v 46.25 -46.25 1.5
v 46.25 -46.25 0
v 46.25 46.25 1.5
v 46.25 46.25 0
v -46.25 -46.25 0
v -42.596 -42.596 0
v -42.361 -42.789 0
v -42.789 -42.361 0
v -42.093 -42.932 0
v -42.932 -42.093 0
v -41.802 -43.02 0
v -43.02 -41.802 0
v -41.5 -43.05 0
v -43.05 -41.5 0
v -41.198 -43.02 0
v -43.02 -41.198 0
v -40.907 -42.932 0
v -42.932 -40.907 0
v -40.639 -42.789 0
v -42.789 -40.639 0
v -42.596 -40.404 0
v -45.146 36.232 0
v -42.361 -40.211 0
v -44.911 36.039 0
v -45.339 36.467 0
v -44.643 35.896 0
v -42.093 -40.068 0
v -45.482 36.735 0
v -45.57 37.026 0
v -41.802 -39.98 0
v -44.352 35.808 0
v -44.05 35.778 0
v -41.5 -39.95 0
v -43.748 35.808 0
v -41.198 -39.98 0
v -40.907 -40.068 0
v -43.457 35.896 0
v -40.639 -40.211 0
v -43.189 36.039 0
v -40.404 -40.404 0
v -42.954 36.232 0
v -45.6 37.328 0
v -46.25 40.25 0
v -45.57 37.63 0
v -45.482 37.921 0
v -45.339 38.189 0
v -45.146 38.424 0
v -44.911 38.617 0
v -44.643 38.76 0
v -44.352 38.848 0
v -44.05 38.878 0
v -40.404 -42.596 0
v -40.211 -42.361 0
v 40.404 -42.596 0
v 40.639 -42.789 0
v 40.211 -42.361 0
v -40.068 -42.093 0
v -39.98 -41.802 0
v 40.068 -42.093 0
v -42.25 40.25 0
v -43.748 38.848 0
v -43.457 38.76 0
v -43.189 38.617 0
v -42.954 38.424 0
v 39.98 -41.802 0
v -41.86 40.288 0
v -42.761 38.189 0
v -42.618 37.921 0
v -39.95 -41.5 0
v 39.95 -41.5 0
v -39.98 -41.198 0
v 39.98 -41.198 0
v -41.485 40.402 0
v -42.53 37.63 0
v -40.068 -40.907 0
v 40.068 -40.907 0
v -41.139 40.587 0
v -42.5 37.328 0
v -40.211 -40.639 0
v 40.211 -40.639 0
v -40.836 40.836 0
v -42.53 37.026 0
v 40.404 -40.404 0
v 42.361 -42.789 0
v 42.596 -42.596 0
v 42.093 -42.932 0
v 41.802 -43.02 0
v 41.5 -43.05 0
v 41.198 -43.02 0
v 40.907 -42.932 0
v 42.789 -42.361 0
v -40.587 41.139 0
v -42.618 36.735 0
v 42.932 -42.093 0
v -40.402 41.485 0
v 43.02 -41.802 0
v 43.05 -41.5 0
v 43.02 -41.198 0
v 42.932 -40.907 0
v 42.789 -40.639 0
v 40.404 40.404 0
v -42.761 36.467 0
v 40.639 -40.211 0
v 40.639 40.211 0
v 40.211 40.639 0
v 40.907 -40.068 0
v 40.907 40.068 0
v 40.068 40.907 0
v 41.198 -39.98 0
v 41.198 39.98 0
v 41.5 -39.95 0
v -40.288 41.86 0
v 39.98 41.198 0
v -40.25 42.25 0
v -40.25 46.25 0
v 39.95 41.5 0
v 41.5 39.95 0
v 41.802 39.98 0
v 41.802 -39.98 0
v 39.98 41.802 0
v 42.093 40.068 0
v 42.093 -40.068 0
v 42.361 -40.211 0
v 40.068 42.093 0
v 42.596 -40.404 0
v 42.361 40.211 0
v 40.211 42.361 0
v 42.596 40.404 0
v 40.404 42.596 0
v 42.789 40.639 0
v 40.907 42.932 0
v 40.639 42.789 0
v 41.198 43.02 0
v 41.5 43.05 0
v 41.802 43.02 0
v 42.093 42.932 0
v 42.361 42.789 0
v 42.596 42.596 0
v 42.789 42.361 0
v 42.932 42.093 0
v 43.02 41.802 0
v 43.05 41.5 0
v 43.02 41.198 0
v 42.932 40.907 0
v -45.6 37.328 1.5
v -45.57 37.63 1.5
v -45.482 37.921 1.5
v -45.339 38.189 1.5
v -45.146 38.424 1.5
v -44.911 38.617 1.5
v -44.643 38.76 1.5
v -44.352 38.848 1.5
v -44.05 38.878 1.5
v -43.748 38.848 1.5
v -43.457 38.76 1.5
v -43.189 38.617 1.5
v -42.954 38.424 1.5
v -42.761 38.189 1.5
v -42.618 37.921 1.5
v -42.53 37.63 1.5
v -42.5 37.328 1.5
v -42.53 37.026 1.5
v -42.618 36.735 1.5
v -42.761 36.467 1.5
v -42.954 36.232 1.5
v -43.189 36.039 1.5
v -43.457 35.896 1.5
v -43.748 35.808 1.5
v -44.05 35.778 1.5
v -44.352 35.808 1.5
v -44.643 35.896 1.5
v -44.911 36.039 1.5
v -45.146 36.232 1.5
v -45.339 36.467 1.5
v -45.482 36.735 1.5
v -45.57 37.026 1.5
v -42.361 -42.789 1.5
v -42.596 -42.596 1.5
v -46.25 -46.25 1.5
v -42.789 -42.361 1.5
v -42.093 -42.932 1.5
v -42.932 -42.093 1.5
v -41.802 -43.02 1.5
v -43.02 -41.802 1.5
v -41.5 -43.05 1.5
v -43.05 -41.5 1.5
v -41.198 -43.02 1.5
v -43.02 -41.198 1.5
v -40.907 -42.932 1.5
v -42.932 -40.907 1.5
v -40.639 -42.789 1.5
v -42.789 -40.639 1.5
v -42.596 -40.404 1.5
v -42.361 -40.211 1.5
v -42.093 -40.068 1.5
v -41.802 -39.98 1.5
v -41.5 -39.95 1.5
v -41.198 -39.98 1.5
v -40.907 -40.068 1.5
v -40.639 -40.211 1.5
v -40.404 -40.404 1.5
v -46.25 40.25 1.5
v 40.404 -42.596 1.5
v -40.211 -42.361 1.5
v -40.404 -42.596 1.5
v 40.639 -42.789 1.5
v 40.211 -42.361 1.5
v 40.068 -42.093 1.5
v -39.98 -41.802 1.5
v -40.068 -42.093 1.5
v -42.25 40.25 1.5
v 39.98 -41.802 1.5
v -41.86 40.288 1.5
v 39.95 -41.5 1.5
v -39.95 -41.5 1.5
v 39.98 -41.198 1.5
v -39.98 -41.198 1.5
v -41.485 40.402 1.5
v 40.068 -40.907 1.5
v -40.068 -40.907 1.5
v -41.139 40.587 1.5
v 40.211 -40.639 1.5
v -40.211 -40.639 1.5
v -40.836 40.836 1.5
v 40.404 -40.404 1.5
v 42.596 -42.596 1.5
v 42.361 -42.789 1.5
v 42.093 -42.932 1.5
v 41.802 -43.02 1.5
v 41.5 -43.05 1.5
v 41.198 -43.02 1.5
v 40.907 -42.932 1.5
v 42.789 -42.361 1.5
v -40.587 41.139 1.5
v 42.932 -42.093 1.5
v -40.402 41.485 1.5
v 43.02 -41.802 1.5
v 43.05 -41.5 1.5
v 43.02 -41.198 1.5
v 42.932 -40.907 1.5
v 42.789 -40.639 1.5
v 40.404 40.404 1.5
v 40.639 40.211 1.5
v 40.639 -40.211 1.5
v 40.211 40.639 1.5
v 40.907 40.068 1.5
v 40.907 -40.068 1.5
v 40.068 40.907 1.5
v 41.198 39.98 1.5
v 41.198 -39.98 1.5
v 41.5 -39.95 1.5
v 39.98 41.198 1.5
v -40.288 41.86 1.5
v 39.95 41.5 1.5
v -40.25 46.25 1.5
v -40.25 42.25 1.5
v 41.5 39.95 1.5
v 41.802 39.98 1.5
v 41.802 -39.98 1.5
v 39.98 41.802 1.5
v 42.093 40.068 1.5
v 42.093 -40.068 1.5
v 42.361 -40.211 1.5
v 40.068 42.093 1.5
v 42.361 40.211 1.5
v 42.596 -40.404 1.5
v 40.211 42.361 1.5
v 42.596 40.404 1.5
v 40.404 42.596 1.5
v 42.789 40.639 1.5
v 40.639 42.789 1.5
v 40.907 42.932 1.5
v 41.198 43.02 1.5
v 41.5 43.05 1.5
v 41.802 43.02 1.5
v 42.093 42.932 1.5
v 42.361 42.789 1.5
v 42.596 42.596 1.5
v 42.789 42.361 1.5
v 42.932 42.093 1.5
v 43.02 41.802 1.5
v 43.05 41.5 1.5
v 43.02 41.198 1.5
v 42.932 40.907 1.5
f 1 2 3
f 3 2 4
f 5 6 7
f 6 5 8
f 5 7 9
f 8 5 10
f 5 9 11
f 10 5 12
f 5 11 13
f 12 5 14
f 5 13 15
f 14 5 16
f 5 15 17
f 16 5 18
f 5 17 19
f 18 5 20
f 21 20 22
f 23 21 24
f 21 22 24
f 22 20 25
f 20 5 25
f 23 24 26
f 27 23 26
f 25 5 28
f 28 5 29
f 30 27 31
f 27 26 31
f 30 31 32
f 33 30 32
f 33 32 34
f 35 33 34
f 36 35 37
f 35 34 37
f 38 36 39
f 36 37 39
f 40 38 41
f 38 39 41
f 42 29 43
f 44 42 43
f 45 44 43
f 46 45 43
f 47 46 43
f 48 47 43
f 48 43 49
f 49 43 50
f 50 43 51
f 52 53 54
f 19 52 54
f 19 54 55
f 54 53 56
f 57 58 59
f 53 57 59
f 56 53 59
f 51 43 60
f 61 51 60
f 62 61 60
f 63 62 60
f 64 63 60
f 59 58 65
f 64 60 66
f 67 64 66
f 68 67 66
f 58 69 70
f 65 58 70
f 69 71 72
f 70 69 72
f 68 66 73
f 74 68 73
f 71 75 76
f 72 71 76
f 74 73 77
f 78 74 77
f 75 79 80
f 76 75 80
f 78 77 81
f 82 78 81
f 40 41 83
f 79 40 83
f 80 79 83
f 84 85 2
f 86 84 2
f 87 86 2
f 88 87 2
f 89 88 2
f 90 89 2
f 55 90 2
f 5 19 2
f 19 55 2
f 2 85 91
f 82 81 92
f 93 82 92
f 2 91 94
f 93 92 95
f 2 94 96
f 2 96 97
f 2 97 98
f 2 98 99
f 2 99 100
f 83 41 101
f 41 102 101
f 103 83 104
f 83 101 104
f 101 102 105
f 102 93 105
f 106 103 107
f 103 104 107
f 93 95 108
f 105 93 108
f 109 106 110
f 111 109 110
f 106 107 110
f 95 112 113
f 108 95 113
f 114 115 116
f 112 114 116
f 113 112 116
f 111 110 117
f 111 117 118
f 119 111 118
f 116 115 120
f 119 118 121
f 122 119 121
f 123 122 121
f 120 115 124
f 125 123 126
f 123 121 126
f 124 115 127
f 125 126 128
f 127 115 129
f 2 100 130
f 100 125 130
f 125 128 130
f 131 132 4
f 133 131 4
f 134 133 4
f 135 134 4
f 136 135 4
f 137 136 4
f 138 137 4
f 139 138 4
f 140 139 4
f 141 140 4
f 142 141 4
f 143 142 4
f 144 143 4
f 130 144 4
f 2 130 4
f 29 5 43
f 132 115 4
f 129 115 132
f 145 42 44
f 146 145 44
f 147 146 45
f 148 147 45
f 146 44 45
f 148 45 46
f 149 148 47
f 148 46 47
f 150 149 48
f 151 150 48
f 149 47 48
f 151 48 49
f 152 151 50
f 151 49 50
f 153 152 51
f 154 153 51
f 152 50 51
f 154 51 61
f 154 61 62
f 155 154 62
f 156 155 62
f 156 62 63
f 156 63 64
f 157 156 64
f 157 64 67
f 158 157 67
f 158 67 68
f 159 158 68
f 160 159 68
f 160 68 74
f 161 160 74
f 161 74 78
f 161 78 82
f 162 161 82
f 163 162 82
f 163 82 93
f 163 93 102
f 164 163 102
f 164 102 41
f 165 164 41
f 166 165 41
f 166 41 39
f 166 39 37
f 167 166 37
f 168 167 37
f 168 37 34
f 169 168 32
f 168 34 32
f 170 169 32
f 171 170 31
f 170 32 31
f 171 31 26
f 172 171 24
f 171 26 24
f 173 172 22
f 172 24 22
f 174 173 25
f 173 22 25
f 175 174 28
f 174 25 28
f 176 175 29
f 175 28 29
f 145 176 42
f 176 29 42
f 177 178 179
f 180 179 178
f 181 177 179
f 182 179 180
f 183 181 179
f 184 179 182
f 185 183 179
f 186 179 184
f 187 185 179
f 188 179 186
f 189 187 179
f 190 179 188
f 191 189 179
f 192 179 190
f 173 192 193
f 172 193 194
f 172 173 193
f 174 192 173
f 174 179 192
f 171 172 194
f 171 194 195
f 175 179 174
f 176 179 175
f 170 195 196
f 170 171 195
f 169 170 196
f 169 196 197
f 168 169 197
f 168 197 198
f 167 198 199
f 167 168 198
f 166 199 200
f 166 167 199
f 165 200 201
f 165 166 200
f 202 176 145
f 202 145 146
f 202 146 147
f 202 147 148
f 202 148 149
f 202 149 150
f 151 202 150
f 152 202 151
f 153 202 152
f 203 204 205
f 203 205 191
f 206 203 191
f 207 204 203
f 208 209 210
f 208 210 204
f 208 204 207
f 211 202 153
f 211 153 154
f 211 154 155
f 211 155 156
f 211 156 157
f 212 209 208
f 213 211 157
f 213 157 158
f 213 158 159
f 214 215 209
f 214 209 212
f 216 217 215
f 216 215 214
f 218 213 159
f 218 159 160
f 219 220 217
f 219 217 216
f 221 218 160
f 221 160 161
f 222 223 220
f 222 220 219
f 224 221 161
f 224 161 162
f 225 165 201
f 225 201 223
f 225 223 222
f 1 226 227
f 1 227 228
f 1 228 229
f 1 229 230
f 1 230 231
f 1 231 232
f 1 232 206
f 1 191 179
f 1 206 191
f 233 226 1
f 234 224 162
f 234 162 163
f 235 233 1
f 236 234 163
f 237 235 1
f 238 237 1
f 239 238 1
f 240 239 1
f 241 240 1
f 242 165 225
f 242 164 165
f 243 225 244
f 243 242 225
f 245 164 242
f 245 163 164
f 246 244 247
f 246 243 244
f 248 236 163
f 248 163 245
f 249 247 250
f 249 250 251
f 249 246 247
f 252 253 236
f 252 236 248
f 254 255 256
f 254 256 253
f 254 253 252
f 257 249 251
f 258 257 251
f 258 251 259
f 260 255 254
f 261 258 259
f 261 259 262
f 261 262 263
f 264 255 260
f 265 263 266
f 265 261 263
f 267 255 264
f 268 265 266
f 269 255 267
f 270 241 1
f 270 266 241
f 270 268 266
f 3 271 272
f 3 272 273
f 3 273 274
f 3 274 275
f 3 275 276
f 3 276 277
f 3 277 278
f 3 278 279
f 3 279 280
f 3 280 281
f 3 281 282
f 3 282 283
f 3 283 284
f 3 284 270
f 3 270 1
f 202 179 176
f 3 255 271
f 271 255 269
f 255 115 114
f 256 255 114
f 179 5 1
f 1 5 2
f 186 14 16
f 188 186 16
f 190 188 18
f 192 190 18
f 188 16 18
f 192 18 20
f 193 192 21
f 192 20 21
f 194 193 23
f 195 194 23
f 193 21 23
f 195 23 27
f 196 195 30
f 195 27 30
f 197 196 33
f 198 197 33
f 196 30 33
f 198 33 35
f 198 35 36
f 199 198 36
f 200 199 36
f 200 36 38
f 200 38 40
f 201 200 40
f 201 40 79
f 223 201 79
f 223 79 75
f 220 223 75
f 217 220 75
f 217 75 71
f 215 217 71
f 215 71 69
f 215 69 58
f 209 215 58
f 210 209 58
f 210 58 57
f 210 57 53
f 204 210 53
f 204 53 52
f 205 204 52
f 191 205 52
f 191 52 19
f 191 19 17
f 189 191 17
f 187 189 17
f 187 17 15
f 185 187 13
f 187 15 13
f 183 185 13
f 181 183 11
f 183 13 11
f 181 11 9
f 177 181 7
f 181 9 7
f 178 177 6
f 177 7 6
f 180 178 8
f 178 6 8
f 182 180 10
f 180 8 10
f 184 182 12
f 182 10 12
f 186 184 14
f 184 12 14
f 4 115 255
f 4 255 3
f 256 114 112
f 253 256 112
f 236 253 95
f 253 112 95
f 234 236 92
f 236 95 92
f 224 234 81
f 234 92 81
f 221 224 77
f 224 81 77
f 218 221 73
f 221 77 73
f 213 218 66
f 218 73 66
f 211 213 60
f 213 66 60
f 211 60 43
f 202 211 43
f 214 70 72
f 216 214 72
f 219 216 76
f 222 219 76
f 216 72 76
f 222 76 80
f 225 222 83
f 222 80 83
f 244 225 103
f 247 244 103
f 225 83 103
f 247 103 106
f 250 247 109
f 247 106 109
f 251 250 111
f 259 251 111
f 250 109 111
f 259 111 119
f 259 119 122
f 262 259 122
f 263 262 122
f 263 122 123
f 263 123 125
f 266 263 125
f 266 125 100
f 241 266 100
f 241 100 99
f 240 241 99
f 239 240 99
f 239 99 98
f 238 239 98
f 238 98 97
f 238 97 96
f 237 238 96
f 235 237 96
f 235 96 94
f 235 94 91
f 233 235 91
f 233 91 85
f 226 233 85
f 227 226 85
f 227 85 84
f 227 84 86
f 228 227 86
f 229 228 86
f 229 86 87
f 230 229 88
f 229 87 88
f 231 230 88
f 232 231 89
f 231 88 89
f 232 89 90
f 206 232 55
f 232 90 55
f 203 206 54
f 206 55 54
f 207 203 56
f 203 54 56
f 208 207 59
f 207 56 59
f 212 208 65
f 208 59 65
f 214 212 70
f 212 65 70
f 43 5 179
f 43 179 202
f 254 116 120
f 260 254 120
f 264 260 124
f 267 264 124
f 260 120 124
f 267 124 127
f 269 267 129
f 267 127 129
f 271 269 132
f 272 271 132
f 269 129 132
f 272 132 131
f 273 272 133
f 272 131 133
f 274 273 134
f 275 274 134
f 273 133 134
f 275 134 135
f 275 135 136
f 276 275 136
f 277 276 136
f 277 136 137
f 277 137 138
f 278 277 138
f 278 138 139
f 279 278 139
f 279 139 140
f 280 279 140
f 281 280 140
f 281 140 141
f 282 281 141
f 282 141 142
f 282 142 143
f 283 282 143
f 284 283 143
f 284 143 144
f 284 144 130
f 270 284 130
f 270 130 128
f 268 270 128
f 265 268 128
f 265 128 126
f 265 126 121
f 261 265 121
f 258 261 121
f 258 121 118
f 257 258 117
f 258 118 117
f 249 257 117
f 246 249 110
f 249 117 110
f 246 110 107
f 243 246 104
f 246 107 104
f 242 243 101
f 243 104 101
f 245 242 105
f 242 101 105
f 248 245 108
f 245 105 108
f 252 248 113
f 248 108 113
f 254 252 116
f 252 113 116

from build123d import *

# Parameters (mm, degrees)
SKETCH1_W                  = 92.5
SKETCH1_H                  = 92.5
BOSS_EXTRUDE1_DEPTH        = 1.5
F_3_1_3_1_DIAMETER_HOLE1_D = 3.1
CUT_EXTRUDE1_DEPTH         = 10


with BuildPart() as part:
    # Sketch1 → Boss-Extrude1 (new body)
    with BuildSketch(Plane.XY):
        Rectangle(SKETCH1_W, SKETCH1_H)
    extrude(amount=BOSS_EXTRUDE1_DEPTH)

    # Ø3.1 (3.1) Diameter Hole1 (through all)
    with Locations(Plane.XY.offset(1.5)):
        with Locations((-44.05, 37.328004442), (41.5, 41.5), (41.5, -41.5), (-41.5, -41.5)):
            Hole(F_3_1_3_1_DIAMETER_HOLE1_D / 2)

    # Sketch6 → Cut-Extrude1 (cut)
    with BuildSketch(Plane(origin=(0, 0, 0), x_dir=(-1, 0, 0), z_dir=(0, 0, -1))):
        with BuildLine():
            Line((46.25, 46.25), (40.25, 46.25))
            Line((40.25, 46.25), (40.25, 42.25))
            ThreePointArc((40.25, 42.25), (40.835786438, 40.835786438), (42.25, 40.25))
            Line((42.25, 40.25), (46.25, 40.25))
            Line((46.25, 40.25), (46.25, 46.25))
        make_face()
    extrude(amount=-CUT_EXTRUDE1_DEPTH, mode=Mode.SUBTRACT)


solid = part.part
